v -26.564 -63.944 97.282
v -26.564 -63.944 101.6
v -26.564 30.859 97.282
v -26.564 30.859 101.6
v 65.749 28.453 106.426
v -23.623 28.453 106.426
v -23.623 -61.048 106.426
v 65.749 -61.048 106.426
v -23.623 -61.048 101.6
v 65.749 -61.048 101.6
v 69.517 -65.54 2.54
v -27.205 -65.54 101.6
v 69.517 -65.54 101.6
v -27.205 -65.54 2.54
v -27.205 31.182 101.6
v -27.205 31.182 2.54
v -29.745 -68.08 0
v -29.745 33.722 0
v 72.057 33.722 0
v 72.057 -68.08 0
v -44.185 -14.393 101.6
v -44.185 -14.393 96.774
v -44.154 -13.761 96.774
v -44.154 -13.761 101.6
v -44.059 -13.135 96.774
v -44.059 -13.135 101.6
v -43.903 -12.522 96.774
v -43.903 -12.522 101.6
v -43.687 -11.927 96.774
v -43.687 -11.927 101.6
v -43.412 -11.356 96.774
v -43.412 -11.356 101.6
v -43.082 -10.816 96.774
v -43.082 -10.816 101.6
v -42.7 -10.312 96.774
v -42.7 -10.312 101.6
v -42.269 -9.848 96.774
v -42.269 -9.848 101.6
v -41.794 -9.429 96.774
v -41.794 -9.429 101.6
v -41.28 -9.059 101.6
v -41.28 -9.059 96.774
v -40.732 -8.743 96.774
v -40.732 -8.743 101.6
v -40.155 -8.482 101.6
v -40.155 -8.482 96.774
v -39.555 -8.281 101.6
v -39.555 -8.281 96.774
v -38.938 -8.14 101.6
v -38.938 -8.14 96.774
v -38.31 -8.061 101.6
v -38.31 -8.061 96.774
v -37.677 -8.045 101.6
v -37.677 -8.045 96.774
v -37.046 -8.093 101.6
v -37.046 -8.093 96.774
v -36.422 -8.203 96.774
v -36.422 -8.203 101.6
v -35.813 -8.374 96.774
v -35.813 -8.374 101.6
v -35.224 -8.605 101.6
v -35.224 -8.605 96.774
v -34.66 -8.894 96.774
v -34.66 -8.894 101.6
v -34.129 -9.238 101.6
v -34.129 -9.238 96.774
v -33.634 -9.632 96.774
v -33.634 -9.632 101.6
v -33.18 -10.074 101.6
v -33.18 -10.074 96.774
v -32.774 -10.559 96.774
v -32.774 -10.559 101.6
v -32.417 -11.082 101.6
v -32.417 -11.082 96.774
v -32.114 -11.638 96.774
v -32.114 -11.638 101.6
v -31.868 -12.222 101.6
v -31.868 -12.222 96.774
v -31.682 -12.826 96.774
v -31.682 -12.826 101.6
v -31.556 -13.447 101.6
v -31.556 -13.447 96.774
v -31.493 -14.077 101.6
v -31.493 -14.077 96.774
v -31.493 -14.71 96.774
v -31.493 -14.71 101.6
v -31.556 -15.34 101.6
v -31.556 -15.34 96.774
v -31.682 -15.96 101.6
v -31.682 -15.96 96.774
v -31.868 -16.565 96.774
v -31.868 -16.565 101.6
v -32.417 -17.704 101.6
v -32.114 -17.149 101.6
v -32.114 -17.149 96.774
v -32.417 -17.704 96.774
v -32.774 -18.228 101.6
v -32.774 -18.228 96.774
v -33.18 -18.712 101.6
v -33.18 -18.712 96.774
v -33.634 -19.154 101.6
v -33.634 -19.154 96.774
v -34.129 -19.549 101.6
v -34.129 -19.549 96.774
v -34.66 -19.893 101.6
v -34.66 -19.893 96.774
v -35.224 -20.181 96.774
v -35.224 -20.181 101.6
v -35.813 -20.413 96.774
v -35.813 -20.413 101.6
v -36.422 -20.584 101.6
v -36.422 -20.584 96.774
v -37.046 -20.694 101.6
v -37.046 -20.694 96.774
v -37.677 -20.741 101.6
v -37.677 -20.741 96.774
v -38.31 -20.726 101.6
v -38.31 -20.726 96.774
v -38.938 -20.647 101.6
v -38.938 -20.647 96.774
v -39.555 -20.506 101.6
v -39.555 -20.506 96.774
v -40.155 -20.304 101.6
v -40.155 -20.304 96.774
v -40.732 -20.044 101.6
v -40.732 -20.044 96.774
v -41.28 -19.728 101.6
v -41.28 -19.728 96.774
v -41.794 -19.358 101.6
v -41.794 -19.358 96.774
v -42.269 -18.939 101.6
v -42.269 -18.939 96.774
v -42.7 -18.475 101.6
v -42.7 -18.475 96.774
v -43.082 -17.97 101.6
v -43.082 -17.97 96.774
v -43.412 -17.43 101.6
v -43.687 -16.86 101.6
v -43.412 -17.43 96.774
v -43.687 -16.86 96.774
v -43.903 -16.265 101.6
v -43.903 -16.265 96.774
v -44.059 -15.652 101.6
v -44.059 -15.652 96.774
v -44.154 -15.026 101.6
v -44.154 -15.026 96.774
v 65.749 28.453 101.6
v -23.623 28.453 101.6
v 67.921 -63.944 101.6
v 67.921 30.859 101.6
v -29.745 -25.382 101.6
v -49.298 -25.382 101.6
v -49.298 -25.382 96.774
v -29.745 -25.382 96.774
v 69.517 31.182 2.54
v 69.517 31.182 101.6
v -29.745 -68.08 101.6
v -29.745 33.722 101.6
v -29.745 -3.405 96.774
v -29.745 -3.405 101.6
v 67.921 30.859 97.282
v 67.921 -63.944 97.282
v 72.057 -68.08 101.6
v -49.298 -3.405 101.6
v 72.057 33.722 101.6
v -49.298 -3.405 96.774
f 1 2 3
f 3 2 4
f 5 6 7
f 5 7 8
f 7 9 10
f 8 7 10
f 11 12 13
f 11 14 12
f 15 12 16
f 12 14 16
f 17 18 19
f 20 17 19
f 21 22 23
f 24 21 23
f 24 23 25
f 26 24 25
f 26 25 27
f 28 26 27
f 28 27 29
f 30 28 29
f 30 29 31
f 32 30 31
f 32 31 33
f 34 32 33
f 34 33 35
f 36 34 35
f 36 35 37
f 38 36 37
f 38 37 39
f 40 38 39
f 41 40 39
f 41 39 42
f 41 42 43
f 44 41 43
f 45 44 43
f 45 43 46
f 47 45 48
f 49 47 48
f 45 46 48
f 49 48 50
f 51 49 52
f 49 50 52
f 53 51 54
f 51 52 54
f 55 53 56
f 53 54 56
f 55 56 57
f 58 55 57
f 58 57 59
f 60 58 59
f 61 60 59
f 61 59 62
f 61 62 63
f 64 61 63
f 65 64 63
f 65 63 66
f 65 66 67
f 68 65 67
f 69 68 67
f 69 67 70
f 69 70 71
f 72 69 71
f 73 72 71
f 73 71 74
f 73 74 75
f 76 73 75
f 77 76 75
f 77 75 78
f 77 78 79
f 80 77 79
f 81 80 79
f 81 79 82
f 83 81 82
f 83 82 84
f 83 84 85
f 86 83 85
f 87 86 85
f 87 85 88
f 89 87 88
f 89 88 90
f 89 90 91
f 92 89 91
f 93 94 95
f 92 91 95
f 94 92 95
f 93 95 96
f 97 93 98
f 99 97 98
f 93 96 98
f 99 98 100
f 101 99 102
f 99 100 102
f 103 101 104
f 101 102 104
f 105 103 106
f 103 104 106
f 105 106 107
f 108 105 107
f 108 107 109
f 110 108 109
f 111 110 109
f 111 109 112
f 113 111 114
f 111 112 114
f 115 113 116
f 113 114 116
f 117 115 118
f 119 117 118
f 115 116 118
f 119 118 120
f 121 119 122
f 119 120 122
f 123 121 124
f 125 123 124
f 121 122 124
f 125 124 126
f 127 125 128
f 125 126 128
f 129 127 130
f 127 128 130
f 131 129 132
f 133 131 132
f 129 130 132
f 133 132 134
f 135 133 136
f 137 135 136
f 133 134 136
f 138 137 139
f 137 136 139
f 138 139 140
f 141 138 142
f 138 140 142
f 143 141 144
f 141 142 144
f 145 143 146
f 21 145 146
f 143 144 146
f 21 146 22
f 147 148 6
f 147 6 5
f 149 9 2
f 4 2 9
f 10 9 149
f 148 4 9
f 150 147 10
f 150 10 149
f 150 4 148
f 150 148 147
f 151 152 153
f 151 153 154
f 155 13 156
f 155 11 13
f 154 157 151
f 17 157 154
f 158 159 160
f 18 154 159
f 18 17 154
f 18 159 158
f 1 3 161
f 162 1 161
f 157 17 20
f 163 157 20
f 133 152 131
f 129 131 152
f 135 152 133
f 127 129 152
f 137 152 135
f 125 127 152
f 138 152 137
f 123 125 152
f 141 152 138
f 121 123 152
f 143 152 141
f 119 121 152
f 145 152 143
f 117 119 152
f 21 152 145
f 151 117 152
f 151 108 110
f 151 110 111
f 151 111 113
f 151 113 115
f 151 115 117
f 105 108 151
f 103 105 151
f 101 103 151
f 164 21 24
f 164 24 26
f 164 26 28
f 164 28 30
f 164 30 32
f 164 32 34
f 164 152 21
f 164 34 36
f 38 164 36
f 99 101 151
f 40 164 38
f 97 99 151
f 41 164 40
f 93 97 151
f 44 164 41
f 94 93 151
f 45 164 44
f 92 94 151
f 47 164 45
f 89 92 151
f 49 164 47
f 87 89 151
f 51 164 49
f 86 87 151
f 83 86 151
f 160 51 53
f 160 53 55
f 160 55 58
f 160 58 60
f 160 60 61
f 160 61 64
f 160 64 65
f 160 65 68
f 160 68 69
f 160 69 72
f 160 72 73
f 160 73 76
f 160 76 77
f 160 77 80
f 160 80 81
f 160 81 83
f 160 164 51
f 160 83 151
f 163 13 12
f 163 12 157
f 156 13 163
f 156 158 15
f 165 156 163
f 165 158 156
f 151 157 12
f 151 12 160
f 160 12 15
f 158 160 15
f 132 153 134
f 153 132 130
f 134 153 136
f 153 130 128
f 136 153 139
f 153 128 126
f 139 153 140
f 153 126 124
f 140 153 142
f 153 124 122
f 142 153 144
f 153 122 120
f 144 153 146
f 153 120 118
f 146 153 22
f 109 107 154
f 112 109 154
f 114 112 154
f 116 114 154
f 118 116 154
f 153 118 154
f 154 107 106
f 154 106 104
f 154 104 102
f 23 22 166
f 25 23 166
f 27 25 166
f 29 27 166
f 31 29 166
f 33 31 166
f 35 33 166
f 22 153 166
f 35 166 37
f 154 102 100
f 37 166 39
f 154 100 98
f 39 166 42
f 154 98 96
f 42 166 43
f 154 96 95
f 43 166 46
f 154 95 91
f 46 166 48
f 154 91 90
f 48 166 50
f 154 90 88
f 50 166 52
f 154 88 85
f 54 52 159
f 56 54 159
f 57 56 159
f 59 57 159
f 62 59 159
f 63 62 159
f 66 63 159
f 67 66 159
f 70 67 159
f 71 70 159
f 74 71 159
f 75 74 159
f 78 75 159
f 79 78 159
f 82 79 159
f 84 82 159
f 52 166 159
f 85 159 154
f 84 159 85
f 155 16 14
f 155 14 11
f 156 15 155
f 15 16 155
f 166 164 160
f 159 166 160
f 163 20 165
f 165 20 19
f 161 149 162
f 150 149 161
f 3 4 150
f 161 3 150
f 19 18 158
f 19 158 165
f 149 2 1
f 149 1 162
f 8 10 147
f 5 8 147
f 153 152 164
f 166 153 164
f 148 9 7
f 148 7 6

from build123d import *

# Parameters (mm, degrees)
F0_W     = 101.801986
F0_H     = 101.801992
F1_DEPTH = 101.6
F2_T     = -2.54
F3_W     = 94.484977
F3_H     = 94.803106
F4_DEPTH = 4.318
F5_W     = 89.372357
F5_H     = 89.501217
F6_DEPTH = 4.826
F7_W     = 20.954728
F7_H     = 21.977729
F8_DEPTH = 4.826
F9_D     = 12.7


with BuildPart() as f1:
    # F0 (on Top) → F1 (new body)
    with BuildSketch(Plane.XY):
        with Locations((21.155725, -17.179087)):
            Rectangle(F0_W, F0_H)
    extrude(amount=F1_DEPTH)

    # F2
    f2_openings = [f1.faces().sort_by_distance(p)[0] for p in [
        (21.155725, -17.179087, 101.6),
    ]]
    offset(amount=F2_T, openings=f2_openings)

    # F7 (on face) → F8 (join)
    with BuildSketch(Plane.XY.offset(101.6)):
        with Locations((-38.820364, -14.393381)):
            Rectangle(F7_W, F7_H)
    extrude(amount=-F8_DEPTH)

    # F9 (through all)
    with Locations(Plane.XY.offset(101.6)):
        with Locations((-37.835293, -14.393382)):
            Hole(F9_D / 2)


with BuildPart() as f4:
    # F3 (on face) → F4 (new body)
    with BuildSketch(Plane.XY.offset(101.6)):
        with Locations((20.678531, -16.542824)):
            Rectangle(F3_W, F3_H)
    extrude(amount=-F4_DEPTH)

    # F5 (on face) → F6 (join)
    with BuildSketch(Plane.XY.offset(101.6)):
        with Locations((21.062922, -16.297649)):
            Rectangle(F5_W, F5_H)
    extrude(amount=F6_DEPTH)


solid = Compound([f1.part, f4.part])
